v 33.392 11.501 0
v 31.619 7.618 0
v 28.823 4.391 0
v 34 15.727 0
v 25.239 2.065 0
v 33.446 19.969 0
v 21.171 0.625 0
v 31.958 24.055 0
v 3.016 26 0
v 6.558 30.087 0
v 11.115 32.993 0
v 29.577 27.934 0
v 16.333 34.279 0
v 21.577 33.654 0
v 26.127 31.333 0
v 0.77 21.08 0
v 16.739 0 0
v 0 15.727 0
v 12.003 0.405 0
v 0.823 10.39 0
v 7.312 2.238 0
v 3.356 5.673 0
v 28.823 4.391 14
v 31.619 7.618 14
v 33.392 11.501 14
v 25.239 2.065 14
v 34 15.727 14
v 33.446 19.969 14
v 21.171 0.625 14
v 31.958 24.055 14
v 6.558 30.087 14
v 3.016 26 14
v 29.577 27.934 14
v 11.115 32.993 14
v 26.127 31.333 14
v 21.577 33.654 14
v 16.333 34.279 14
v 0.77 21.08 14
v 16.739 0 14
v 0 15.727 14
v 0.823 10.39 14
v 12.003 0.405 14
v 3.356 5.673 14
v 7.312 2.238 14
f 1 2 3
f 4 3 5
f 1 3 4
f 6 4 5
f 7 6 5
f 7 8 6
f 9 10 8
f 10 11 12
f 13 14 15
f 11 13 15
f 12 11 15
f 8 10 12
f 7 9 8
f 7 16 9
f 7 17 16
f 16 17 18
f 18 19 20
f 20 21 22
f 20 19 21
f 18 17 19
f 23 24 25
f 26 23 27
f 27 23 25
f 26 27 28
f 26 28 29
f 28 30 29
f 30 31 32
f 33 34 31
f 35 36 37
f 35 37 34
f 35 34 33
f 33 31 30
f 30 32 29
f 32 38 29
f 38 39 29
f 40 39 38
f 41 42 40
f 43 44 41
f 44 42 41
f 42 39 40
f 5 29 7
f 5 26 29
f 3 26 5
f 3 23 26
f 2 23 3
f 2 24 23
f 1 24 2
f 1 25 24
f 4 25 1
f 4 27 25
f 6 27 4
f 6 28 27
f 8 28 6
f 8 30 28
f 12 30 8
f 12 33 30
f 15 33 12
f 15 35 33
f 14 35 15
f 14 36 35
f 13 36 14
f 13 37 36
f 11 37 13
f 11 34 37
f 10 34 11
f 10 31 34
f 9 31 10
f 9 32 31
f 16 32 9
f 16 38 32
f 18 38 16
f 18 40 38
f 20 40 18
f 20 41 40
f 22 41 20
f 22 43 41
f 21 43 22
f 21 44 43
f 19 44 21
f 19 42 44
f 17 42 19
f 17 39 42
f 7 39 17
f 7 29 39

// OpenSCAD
$fn = 32;

// ----------------------------------------------------------------------
// Cam disc: base radius 15.0 mm, lift 4.0 mm, 22 profile points
// ----------------------------------------------------------------------

// --- parameters (mm) ---
profile_height = 14;      // extrusion height
profile_points = 22;      // points of the closed outline

profile = [[34, 15.727], [33.446, 19.969], [31.958, 24.055], [29.577, 27.934], [26.127, 31.333], [21.577, 33.654], [16.333, 34.279], [11.115, 32.993], [6.558, 30.087], [3.016, 26], [0.77, 21.08], [0, 15.727], [0.823, 10.39], [3.356, 5.673], [7.312, 2.238], [12.003, 0.405], [16.739, 0], [21.171, 0.625], [25.239, 2.065], [28.823, 4.391], [31.619, 7.618], [33.392, 11.501]];  // single closed polygon, 22 points, counter clockwise

// --- the one profile operation ---
linear_extrude(height = profile_height) polygon(points = profile);
